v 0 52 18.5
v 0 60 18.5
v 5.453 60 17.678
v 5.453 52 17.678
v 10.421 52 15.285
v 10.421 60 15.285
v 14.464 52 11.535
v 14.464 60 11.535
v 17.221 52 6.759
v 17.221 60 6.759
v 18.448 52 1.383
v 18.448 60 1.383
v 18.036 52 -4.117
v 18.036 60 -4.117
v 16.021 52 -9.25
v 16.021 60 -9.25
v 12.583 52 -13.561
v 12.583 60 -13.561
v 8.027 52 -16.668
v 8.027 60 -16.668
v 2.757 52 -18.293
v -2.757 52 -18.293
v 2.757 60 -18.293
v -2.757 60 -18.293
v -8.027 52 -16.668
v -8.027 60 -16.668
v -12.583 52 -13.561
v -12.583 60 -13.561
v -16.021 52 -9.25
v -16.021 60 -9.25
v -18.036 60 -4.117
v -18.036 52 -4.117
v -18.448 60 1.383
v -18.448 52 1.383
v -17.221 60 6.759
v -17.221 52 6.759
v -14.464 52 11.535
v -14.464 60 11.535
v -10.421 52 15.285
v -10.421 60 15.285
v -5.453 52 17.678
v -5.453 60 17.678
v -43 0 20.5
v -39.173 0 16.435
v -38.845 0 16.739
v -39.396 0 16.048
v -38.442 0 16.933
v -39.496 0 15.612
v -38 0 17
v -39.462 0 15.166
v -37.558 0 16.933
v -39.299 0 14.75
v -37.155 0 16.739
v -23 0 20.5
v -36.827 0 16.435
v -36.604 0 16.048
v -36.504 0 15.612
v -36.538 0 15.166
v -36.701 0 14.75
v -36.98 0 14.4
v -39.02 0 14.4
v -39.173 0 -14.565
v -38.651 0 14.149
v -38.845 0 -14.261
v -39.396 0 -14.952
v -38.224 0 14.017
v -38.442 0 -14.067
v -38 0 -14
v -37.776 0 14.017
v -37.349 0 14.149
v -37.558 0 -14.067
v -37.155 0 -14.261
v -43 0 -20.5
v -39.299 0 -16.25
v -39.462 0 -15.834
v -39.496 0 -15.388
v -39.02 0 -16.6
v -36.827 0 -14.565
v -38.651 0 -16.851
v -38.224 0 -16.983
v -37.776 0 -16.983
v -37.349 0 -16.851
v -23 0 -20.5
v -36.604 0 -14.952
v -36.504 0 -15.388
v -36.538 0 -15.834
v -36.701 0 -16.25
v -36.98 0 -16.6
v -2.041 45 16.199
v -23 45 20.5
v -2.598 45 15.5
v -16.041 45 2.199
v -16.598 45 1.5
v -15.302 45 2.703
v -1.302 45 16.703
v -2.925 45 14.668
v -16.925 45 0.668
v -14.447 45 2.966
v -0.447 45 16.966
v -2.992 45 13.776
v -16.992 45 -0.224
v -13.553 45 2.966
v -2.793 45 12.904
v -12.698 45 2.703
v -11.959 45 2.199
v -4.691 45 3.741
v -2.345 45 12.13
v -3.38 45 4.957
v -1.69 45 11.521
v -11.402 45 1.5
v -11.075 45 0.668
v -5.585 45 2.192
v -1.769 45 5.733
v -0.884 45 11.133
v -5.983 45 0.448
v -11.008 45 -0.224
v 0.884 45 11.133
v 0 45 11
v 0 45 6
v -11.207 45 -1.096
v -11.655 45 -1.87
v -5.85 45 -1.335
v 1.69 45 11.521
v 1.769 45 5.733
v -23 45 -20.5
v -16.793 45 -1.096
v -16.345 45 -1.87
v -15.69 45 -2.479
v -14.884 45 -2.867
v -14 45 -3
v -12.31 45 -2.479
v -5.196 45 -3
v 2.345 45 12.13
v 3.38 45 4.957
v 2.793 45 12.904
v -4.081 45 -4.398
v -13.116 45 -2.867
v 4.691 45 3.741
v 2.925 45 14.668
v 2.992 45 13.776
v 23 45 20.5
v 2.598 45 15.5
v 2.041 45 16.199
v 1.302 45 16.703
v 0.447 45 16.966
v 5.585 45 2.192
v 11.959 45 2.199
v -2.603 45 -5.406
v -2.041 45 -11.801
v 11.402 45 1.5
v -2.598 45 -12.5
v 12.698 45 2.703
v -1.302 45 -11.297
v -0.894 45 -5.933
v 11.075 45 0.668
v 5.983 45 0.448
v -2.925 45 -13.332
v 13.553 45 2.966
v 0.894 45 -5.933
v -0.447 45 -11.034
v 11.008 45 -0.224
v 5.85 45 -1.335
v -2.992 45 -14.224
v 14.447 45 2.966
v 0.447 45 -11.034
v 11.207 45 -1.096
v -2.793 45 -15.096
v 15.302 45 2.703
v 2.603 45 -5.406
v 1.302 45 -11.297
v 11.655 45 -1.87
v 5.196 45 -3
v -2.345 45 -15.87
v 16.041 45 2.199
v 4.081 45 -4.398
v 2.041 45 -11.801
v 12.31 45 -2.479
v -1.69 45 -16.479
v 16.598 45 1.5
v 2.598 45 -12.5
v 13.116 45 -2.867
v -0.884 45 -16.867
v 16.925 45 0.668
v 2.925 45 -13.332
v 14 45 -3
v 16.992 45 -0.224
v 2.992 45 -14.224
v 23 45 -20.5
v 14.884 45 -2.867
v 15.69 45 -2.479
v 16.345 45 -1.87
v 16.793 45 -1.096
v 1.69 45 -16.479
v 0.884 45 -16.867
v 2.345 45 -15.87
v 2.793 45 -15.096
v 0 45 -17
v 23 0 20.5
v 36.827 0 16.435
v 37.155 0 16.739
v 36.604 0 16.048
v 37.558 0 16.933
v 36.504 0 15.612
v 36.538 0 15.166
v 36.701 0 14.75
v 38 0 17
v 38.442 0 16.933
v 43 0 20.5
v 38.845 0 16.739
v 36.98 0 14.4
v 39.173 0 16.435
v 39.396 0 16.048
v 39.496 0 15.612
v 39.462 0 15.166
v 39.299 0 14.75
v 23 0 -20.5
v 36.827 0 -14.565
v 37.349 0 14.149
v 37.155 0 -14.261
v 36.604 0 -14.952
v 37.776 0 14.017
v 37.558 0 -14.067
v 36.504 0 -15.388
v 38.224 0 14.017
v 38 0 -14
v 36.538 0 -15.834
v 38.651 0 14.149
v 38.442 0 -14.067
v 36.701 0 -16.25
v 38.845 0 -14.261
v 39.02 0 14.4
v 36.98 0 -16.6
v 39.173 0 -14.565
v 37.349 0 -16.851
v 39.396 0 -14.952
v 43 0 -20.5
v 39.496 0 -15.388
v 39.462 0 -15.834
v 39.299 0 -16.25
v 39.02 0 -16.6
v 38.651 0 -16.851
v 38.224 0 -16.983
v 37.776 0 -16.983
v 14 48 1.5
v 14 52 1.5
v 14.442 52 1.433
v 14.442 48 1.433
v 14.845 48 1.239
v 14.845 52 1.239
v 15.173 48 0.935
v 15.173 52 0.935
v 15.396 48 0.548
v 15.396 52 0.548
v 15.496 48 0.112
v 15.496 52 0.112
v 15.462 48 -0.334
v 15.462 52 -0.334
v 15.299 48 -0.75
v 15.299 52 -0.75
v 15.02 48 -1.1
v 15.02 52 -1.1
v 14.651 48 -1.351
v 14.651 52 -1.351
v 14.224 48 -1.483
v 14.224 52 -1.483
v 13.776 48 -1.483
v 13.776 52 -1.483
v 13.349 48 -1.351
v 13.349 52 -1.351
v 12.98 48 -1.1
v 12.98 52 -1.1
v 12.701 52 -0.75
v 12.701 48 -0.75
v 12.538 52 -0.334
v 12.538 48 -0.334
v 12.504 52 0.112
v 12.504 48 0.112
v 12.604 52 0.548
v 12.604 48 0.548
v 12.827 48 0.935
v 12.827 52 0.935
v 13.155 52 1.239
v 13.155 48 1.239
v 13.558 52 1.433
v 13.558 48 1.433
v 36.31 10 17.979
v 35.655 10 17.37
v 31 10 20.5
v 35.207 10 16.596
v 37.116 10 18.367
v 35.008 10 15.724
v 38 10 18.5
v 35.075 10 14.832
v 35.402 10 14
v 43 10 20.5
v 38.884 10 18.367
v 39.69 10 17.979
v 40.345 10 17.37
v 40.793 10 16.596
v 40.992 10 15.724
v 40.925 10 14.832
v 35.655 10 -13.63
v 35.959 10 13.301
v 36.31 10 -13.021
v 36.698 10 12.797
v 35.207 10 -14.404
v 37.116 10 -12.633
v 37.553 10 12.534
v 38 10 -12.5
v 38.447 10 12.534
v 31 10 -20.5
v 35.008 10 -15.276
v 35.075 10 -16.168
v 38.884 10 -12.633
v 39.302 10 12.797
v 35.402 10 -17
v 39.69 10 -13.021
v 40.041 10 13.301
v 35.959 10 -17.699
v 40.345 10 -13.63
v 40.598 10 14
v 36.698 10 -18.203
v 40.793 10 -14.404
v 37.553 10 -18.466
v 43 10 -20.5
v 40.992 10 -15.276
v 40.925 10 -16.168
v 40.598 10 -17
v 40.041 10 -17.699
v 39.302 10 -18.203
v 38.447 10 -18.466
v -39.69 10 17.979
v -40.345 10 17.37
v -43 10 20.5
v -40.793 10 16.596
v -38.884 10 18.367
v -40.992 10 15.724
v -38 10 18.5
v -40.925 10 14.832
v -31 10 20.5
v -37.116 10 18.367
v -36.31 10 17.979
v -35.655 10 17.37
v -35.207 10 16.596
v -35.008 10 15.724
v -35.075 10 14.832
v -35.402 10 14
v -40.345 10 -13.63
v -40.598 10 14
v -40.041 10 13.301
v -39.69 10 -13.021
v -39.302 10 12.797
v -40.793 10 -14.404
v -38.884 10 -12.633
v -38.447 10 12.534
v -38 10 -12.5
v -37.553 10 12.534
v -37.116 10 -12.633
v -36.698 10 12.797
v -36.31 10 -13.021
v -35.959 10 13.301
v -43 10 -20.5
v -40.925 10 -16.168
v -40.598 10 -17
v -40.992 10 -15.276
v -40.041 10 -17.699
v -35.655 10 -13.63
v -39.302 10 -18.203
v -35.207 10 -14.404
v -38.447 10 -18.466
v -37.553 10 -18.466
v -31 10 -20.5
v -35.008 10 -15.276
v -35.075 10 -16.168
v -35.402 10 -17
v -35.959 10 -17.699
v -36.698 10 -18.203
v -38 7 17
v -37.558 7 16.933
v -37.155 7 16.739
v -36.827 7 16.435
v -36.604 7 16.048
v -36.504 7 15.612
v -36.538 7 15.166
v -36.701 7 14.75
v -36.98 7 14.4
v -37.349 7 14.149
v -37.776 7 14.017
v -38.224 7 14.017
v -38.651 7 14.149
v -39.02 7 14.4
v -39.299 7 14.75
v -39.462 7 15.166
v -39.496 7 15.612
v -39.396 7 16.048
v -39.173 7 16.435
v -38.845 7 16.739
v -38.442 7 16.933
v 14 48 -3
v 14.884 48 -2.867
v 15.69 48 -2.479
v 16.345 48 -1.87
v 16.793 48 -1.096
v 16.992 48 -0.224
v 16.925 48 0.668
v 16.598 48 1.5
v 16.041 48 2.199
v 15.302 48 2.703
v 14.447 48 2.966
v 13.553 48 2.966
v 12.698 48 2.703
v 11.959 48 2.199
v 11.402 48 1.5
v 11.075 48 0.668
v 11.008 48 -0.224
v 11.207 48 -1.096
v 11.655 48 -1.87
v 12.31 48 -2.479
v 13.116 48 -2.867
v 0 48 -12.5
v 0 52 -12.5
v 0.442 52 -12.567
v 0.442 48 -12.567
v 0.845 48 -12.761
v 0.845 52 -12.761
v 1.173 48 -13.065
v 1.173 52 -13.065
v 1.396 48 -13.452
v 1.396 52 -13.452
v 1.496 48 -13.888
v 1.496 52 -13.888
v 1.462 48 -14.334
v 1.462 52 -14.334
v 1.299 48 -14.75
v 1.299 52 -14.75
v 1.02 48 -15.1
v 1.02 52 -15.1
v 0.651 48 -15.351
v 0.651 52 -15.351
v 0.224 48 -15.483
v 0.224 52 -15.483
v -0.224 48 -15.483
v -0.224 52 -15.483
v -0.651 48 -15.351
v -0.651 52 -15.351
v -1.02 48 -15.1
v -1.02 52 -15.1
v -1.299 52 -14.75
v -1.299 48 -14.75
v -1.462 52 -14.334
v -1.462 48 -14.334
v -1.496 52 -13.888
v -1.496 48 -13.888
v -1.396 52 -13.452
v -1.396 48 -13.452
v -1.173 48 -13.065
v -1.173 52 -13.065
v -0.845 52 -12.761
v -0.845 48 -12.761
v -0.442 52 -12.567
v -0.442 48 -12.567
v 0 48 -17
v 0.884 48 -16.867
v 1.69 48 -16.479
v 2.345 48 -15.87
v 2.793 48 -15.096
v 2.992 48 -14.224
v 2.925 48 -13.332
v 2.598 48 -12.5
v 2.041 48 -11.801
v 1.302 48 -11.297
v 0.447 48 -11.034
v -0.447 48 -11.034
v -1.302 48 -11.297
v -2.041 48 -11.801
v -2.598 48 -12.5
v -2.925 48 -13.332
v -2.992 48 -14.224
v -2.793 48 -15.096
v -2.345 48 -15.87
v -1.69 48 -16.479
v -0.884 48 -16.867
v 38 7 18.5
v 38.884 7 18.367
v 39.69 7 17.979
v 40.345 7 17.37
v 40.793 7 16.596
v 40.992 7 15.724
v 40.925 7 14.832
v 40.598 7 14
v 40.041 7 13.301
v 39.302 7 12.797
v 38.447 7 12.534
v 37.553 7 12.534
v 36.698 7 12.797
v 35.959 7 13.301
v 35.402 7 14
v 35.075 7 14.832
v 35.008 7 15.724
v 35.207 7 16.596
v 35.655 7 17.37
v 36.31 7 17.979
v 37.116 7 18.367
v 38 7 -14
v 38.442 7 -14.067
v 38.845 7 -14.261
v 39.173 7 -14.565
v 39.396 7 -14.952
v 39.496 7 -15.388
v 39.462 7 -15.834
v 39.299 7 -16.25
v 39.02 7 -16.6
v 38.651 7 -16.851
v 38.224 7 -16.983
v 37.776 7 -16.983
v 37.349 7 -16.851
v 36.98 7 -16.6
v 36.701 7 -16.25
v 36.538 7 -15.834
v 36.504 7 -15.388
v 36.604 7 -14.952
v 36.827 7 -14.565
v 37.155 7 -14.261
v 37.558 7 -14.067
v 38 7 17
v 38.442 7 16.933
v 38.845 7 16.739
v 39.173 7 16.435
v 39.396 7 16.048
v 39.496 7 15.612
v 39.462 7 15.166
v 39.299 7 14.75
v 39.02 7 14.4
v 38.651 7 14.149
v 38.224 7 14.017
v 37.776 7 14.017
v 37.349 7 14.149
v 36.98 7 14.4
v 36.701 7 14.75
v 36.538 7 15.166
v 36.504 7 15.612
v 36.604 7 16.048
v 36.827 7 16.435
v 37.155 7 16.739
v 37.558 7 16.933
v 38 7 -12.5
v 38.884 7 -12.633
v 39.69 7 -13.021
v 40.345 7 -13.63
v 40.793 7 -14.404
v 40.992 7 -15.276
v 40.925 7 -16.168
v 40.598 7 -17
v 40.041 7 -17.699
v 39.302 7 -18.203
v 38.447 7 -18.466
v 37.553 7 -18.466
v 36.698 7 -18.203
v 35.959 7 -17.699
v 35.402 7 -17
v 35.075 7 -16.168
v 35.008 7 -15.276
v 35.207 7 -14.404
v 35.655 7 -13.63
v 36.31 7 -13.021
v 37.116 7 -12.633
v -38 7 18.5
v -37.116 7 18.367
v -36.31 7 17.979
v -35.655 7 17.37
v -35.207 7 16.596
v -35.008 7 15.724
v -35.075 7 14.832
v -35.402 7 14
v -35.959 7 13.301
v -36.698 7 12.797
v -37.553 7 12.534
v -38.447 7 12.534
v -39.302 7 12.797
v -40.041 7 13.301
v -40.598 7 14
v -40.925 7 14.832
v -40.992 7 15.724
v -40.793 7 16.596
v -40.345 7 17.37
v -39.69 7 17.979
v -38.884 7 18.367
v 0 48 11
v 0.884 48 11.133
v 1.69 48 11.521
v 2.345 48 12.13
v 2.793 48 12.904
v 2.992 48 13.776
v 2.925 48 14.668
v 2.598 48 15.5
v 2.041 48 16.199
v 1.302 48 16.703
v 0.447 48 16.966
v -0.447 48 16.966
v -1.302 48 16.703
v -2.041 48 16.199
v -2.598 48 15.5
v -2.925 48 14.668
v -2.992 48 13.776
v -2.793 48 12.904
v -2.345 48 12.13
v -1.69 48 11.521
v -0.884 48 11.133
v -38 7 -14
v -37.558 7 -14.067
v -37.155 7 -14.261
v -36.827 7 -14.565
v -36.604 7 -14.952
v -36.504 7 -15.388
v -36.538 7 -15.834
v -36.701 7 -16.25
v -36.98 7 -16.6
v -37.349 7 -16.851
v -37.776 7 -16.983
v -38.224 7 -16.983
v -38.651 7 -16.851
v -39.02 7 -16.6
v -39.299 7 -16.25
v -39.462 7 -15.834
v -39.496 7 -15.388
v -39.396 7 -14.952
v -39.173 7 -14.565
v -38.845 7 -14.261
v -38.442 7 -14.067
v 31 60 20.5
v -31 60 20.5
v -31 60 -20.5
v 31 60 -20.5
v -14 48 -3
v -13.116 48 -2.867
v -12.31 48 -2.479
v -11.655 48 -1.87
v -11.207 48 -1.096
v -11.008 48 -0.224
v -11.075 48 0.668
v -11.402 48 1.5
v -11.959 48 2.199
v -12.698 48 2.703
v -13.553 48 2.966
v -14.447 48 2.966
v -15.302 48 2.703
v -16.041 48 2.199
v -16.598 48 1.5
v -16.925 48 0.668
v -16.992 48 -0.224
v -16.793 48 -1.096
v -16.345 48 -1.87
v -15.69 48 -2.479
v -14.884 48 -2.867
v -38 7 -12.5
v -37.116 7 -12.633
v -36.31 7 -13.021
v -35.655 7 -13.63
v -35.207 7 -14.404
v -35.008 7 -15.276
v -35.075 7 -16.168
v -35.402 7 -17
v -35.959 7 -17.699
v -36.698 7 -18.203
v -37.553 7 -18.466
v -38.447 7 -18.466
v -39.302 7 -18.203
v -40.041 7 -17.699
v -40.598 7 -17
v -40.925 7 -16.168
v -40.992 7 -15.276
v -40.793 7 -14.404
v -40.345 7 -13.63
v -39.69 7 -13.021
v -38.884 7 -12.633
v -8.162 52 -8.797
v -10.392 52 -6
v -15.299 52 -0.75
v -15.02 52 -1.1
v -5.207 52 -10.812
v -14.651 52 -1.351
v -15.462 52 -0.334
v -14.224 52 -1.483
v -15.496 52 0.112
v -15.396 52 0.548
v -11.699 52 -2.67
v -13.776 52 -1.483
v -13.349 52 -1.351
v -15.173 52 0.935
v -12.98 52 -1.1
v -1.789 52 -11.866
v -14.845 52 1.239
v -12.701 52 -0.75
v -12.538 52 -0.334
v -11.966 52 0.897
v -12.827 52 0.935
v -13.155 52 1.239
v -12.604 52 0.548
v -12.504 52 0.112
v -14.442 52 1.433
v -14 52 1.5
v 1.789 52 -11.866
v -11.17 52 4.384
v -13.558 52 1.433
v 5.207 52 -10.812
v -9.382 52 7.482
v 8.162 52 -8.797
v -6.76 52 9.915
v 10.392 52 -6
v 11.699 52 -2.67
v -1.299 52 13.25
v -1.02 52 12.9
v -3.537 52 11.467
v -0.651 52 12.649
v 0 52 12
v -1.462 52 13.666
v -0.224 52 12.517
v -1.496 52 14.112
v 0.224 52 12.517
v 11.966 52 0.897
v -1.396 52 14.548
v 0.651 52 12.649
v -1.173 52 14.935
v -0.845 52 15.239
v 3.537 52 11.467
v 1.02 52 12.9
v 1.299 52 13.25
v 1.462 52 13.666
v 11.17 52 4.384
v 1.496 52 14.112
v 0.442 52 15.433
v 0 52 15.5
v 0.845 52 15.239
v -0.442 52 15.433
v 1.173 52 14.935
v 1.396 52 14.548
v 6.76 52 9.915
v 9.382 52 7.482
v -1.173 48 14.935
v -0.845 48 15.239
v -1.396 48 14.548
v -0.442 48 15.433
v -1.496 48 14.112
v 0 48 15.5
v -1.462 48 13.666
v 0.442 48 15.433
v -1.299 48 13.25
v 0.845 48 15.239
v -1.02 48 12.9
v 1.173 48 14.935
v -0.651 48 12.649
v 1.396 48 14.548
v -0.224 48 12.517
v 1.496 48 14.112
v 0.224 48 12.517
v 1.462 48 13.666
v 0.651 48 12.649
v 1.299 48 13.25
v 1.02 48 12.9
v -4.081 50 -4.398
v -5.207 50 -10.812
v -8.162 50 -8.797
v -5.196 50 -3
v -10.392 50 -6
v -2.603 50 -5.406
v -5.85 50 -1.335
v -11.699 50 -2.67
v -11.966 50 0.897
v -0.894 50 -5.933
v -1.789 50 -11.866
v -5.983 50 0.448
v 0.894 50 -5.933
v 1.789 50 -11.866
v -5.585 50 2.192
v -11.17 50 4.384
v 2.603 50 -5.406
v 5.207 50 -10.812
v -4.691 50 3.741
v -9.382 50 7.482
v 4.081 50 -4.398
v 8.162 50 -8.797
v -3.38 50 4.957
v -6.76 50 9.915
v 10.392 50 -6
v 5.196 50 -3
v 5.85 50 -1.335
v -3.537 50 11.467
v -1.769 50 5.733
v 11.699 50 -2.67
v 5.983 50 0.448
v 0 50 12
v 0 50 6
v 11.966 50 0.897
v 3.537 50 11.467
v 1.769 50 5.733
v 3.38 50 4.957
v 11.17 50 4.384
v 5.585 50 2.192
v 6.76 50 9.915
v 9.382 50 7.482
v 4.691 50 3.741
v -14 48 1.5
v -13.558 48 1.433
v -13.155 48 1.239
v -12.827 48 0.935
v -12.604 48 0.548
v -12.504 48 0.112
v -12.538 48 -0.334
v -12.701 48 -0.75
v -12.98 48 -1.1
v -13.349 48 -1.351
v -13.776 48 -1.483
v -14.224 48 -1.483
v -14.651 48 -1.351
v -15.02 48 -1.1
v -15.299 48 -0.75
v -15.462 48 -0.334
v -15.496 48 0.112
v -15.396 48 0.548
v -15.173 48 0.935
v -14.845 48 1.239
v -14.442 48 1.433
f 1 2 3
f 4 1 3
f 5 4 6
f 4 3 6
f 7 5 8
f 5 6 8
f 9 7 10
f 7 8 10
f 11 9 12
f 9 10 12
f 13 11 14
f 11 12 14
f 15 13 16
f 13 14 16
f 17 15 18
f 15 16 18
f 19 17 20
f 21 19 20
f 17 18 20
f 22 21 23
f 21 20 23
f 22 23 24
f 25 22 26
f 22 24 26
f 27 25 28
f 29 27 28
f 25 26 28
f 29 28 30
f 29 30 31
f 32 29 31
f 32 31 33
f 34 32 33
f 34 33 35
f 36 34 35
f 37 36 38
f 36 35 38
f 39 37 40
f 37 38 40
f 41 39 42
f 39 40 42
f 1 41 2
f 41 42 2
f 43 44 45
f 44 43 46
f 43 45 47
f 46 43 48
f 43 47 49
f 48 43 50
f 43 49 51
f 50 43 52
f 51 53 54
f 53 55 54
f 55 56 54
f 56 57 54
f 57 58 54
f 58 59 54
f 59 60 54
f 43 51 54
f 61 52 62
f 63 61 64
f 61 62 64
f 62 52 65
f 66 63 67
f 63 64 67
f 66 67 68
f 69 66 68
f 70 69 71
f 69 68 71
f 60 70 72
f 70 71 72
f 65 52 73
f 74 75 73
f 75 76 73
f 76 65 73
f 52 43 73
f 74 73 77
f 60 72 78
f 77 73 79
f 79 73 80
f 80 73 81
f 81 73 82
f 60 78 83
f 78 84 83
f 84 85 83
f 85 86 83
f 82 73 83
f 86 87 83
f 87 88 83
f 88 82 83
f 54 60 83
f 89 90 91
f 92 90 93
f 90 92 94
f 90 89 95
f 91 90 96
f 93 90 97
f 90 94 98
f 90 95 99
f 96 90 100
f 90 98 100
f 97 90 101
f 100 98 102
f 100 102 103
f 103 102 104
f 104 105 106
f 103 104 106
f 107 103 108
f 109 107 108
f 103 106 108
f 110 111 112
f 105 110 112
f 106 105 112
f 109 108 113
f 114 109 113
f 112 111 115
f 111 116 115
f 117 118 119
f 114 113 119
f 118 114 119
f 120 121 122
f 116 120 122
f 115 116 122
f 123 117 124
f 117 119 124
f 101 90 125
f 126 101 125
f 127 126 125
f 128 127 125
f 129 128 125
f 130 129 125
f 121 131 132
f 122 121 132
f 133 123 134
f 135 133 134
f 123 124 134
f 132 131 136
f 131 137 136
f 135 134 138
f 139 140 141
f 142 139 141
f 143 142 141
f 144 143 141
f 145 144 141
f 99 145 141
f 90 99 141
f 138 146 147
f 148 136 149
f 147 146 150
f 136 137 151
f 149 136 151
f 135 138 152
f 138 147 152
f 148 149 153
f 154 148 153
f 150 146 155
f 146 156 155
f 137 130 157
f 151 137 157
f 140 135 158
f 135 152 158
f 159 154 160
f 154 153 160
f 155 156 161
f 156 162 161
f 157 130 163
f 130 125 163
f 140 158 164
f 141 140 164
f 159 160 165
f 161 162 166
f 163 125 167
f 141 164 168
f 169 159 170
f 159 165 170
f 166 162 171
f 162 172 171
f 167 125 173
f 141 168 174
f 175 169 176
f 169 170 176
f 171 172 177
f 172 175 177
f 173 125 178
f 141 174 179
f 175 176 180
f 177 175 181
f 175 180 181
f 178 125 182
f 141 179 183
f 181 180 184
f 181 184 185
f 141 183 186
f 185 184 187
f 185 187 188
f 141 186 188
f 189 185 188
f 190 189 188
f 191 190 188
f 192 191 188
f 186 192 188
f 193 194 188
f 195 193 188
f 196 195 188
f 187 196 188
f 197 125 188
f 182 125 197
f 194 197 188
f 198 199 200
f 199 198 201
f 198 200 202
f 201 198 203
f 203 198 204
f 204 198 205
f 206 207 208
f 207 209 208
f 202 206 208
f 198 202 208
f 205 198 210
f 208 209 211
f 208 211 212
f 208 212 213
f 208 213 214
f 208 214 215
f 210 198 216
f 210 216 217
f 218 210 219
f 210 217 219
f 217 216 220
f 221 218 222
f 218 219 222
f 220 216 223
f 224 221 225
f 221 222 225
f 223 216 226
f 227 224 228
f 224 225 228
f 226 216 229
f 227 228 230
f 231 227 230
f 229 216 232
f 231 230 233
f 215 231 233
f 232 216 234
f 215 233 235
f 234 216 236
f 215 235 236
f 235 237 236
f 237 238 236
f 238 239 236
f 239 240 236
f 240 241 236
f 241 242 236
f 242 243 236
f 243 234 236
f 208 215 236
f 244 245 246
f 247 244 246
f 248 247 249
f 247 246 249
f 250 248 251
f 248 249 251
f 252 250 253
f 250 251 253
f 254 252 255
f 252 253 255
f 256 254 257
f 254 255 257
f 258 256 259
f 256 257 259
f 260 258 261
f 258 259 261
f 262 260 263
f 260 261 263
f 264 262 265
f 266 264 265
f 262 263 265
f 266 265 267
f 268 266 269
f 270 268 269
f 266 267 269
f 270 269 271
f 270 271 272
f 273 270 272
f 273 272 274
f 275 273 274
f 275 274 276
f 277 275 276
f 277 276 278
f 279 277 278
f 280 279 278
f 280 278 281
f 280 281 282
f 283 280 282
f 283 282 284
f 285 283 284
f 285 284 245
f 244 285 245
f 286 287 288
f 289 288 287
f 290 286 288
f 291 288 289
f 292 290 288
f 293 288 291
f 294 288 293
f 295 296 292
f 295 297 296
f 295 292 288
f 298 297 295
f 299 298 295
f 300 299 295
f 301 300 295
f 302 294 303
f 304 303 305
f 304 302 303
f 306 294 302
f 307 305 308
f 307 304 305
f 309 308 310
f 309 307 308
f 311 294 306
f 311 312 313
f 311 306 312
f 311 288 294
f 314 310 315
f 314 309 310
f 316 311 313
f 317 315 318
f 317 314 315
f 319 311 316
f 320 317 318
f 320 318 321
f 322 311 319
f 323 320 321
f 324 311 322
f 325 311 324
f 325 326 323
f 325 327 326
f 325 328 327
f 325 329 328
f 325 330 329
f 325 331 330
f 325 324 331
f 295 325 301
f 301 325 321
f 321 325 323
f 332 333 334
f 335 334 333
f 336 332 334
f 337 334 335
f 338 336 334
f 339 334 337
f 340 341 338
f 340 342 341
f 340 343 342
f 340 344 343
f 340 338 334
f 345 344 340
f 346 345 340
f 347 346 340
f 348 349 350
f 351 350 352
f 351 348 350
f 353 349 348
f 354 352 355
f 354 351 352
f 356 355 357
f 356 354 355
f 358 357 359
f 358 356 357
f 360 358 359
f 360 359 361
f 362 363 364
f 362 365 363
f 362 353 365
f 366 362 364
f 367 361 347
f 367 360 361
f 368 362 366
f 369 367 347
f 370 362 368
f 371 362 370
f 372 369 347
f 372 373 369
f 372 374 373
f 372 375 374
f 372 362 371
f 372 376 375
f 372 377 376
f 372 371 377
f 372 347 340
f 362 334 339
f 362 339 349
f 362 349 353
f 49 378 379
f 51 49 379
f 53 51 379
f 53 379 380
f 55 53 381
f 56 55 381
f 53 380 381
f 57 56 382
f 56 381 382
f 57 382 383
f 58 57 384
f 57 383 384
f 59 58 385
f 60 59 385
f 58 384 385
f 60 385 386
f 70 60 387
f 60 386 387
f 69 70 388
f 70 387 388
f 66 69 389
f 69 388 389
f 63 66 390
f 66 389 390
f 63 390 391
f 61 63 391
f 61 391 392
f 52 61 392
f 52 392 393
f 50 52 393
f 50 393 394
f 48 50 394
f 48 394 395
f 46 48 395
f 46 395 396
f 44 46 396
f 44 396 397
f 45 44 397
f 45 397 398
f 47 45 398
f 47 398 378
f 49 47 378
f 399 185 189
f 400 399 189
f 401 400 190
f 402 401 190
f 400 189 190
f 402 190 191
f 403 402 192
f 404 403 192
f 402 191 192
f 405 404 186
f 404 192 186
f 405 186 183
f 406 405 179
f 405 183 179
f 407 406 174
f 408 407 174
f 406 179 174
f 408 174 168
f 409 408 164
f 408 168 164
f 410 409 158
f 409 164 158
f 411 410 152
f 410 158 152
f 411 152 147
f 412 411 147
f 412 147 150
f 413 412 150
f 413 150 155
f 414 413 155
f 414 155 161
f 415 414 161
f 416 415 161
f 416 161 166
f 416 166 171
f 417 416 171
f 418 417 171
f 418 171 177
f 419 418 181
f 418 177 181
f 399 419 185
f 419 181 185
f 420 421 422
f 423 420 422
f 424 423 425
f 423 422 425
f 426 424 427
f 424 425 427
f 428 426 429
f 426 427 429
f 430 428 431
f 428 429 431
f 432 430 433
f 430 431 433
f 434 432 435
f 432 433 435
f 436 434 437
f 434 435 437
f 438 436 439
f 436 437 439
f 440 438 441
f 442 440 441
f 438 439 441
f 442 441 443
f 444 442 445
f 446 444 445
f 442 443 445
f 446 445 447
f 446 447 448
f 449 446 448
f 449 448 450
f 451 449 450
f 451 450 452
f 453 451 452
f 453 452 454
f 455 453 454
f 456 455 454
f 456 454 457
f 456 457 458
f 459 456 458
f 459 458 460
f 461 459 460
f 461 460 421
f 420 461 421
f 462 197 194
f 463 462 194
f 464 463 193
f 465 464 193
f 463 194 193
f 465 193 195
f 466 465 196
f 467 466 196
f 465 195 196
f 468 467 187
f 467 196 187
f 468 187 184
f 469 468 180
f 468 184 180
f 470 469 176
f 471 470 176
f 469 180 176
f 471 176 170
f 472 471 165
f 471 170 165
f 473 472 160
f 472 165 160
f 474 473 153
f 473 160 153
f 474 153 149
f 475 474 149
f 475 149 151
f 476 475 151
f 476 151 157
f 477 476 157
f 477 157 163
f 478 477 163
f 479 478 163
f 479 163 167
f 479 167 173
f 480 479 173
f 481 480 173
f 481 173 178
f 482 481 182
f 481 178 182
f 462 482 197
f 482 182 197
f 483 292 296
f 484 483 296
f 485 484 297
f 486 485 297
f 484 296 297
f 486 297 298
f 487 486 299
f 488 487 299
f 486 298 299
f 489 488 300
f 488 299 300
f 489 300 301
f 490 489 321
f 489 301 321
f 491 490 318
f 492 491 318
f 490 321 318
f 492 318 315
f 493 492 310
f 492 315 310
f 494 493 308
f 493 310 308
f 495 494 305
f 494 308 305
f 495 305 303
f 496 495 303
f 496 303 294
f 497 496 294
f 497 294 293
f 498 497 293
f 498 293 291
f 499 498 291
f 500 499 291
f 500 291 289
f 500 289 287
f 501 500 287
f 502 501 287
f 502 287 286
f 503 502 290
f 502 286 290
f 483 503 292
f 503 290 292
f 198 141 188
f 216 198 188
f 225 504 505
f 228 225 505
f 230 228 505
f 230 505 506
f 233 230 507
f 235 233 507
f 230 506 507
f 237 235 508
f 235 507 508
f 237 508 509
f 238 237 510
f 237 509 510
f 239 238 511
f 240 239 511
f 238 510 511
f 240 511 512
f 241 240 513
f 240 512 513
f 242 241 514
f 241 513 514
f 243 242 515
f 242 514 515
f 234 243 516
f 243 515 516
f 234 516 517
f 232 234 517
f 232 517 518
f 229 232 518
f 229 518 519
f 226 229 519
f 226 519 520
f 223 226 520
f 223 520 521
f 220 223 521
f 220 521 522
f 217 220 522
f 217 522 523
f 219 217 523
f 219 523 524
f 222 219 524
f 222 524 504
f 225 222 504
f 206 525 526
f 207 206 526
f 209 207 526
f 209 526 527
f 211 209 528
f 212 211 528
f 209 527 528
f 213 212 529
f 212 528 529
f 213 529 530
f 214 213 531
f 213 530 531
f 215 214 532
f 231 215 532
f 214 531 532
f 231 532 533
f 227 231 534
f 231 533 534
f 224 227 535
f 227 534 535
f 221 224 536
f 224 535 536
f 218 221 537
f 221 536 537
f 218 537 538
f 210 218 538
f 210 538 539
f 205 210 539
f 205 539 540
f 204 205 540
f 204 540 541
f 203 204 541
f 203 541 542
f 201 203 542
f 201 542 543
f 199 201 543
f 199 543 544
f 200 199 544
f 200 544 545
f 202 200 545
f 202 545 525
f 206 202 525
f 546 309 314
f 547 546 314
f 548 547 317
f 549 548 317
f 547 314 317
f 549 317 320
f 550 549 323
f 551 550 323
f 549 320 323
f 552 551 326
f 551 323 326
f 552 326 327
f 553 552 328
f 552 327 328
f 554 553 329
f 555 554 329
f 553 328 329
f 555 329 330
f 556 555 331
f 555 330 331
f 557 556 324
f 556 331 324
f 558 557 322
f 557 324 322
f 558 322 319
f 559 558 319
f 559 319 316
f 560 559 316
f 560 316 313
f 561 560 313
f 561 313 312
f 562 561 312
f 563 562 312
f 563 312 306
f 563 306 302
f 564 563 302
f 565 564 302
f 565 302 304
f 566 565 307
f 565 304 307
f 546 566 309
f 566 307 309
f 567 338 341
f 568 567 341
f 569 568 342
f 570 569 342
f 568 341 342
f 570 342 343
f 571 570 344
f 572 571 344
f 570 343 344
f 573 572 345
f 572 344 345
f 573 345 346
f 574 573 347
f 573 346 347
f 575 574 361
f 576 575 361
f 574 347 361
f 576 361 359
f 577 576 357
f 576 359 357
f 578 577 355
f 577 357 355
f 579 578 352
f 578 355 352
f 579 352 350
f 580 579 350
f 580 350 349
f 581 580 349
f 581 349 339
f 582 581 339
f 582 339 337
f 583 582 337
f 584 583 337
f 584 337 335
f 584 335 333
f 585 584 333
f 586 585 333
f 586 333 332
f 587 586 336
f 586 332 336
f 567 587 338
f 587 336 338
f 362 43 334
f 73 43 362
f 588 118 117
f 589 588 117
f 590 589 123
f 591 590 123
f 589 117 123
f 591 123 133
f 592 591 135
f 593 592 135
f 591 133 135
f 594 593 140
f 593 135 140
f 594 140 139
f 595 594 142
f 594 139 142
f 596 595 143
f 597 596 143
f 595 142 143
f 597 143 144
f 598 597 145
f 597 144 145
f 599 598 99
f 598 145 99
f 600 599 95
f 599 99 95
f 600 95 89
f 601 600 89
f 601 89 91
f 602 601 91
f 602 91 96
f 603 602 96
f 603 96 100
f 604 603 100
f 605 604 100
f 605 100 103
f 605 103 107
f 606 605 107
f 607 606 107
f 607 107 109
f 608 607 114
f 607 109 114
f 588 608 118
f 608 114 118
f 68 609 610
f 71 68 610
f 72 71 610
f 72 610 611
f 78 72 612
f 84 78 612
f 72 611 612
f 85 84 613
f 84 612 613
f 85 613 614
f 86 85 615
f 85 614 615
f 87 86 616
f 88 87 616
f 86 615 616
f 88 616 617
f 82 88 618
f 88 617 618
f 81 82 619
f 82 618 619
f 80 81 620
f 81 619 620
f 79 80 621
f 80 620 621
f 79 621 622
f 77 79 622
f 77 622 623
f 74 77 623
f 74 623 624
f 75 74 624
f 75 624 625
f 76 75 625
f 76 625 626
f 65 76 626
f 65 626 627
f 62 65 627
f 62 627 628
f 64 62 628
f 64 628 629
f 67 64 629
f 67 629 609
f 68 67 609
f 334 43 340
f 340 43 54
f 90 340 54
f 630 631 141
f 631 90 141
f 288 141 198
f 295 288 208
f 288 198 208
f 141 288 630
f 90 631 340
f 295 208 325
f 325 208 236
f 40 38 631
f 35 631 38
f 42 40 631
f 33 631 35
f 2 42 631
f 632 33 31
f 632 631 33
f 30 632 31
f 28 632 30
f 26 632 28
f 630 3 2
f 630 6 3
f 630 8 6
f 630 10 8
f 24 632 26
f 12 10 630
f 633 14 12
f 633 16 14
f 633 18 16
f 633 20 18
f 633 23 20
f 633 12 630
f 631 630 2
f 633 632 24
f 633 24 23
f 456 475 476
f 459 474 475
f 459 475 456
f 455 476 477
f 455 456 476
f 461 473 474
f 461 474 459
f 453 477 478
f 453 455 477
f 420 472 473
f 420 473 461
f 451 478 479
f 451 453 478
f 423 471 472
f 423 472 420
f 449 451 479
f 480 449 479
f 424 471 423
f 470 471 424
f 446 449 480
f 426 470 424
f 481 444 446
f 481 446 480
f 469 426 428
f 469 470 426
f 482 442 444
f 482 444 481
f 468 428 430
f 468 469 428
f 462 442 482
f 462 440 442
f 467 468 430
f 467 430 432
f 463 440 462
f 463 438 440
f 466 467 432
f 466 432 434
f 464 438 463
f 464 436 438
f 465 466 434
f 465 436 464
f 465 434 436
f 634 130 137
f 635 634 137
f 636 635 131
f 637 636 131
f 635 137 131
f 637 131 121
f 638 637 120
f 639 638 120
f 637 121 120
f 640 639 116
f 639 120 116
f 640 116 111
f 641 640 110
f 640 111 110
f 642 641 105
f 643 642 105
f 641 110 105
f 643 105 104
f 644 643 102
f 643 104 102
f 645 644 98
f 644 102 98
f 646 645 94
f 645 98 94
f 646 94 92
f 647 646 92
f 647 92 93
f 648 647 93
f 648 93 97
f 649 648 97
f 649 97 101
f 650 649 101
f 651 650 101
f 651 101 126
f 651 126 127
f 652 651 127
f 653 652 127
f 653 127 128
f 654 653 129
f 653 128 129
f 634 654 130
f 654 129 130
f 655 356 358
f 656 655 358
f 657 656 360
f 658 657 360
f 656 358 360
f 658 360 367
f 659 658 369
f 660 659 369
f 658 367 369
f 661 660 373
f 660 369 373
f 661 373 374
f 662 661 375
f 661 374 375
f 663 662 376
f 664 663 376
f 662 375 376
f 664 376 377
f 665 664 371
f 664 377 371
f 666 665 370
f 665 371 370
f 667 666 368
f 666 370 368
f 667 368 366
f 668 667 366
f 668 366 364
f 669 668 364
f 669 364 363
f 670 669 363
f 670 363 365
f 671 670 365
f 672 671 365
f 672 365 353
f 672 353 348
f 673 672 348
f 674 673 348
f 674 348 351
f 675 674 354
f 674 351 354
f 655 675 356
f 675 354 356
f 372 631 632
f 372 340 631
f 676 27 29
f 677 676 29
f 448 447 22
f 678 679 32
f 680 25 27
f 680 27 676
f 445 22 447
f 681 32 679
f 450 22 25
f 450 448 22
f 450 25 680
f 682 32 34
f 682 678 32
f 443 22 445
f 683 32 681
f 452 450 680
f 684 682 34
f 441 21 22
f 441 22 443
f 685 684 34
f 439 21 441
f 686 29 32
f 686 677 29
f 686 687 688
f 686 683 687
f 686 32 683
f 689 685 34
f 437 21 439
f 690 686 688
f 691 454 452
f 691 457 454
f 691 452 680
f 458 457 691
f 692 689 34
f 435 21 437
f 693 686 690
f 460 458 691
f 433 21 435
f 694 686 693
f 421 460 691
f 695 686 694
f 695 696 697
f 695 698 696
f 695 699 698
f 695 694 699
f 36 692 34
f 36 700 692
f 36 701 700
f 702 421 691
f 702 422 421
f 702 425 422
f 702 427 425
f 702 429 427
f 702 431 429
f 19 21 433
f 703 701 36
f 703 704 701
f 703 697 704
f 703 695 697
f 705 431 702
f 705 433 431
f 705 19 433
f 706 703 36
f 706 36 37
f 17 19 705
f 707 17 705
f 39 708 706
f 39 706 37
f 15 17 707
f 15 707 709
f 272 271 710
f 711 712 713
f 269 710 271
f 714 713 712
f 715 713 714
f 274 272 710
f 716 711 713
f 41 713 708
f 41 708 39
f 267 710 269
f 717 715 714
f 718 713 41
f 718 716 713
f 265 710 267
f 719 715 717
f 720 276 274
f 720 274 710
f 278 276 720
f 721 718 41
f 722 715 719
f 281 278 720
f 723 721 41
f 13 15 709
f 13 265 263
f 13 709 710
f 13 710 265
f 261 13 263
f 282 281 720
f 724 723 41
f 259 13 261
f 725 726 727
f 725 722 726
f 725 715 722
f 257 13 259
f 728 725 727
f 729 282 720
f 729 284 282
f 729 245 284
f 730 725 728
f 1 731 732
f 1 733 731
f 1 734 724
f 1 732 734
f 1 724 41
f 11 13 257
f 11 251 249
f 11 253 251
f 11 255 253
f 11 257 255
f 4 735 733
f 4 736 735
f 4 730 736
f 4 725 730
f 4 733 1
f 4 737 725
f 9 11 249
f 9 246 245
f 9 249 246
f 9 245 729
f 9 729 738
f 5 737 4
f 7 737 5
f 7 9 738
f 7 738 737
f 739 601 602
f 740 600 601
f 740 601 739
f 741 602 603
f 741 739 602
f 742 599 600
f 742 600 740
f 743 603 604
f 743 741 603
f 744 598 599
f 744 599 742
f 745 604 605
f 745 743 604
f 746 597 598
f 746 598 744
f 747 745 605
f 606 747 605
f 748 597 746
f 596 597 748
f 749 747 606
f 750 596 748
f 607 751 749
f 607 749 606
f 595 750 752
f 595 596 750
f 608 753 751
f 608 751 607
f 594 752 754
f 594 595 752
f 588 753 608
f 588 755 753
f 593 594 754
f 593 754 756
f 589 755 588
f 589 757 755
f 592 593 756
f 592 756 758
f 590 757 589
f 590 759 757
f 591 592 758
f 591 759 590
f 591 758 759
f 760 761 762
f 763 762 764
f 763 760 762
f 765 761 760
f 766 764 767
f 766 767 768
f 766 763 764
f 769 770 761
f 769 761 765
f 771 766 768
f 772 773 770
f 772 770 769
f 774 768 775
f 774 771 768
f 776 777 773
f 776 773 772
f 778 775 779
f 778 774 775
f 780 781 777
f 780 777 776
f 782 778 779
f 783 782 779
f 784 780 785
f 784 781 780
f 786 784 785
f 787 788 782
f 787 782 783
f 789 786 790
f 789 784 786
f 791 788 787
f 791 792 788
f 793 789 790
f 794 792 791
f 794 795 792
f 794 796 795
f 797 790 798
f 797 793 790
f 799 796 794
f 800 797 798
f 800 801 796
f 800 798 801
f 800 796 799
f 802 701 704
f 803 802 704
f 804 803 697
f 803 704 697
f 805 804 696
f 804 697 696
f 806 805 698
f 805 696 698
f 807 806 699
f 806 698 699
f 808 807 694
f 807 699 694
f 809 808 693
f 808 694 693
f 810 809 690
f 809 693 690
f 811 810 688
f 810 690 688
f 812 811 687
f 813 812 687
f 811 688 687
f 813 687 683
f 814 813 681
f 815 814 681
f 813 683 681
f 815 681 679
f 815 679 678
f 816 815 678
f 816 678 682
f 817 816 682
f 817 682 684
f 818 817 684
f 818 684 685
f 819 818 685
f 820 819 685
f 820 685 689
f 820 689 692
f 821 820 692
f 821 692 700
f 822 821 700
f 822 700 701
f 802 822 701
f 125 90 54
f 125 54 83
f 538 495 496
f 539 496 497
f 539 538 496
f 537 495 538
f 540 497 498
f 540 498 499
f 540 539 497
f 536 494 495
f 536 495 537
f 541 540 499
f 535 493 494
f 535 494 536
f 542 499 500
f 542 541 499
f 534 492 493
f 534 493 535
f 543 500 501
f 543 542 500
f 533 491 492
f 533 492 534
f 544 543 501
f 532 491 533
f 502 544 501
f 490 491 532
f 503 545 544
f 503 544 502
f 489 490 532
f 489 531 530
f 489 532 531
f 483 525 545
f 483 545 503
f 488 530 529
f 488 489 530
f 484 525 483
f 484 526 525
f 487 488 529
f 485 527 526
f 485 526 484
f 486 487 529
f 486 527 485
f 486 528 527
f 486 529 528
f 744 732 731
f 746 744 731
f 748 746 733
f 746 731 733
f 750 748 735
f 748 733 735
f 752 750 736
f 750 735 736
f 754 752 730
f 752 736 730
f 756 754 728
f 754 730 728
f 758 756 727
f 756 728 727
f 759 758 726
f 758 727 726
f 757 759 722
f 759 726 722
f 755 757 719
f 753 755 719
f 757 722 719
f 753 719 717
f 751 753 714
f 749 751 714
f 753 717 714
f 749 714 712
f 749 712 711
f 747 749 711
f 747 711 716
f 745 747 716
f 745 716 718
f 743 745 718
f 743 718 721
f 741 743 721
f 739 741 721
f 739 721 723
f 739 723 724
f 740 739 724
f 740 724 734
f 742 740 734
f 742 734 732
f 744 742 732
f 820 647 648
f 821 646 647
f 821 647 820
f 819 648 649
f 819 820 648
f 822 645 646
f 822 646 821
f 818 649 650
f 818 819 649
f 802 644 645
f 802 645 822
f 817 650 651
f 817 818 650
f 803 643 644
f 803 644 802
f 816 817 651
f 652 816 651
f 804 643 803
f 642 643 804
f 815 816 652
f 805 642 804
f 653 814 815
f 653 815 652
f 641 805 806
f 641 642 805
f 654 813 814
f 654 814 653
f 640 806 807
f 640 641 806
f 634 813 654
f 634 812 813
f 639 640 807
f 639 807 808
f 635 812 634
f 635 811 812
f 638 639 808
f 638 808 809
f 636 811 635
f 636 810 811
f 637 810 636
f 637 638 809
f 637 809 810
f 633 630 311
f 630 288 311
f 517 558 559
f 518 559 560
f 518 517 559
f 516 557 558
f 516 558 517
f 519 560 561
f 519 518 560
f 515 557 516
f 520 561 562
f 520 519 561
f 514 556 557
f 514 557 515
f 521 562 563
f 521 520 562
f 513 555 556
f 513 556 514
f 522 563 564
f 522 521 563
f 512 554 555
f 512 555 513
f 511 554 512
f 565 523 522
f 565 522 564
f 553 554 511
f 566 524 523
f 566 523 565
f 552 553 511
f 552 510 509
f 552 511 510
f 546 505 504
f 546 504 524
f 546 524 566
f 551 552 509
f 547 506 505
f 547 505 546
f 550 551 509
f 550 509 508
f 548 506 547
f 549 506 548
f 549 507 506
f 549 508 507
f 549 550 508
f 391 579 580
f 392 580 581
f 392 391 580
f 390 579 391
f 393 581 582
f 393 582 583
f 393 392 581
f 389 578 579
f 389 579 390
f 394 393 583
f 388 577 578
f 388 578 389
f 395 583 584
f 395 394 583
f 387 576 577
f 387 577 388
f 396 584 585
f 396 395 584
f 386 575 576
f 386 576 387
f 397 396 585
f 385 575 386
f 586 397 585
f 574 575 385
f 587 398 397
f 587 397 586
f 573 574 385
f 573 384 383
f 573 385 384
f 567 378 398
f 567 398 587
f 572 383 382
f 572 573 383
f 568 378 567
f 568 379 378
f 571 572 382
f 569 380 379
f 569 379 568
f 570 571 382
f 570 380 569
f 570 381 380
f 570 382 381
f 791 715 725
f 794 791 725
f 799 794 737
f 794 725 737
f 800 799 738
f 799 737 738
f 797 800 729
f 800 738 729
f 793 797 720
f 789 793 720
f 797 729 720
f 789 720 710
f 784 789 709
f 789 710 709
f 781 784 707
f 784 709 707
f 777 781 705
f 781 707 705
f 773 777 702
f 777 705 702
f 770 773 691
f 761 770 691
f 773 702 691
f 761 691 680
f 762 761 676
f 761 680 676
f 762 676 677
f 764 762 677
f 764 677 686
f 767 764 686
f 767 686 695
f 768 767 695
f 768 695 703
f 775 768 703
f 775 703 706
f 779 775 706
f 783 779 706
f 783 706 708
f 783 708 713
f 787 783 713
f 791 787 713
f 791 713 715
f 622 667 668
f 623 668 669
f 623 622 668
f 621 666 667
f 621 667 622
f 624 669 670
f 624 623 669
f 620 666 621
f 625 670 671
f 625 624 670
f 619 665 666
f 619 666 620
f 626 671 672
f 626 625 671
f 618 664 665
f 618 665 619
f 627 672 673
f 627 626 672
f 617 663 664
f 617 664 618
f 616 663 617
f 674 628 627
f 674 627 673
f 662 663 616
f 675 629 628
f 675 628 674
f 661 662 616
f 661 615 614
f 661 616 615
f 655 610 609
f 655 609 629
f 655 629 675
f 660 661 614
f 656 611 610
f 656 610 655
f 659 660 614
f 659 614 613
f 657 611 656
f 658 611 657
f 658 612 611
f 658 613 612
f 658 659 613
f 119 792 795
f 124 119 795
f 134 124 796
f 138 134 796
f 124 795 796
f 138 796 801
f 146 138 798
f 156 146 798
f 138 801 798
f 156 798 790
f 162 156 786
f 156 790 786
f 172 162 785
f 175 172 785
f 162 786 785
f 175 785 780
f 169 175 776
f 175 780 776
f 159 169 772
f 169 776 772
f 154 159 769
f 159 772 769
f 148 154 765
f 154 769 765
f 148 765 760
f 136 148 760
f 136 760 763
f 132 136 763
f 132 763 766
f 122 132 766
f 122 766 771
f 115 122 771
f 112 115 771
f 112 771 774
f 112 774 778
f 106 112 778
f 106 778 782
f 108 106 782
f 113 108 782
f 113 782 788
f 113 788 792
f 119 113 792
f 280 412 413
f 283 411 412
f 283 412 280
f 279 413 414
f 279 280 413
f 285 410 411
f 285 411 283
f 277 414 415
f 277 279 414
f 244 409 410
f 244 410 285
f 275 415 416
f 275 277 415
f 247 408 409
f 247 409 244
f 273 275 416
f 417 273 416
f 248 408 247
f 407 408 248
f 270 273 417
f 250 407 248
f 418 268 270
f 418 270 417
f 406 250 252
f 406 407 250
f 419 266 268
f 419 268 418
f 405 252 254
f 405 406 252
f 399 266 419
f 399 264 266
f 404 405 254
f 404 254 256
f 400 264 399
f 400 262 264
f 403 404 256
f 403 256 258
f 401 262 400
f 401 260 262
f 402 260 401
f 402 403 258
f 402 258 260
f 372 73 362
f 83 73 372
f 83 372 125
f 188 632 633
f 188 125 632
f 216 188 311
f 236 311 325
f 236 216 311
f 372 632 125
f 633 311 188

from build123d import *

# Parameters (mm, degrees)
SKETCH1_W                      = 20
SKETCH1_H                      = 41
BOSS_EXTRUDE1_DEPTH            = 10
BOSS_EXTRUDE1_2_DEPTH          = 10
SKETCH2_R                      = 1.5
CUT_EXTRUDE1_DEPTH             = 10
SKETCH3_R                      = 3
CUT_EXTRUDE2_DEPTH             = 3
SKETCH4_W                      = 8
SKETCH4_H                      = 41
BOSS_EXTRUDE2_DEPTH            = 35
SKETCH5_W                      = 62
SKETCH5_H                      = 41
BOSS_EXTRUDE3_DEPTH            = 15
CUT_EXTRUDE3_REACH             = 78.611
SKETCH6_R                      = 1.5
SKETCH7_R                      = 3
CUT_EXTRUDE4_DEPTH             = 3
SKETCH8_R                      = 12
CUT_EXTRUDE5_DEPTH             = 10
CUT_EXTRUDE6_REACH             = 78.611
SKETCH9_R                      = 6
CUT_EXTRUDE6_DIRECTION_2_DEPTH = 77.611030537
SKETCH10_R                     = 18.5
CUT_EXTRUDE7_DEPTH             = 8


with BuildPart() as part:
    # Sketch1 → Boss-Extrude1 (new body)
    with BuildSketch(Plane(origin=(0, 0, 0), x_dir=(1, 0, 0), z_dir=(0, 1, 0))):
        with Locations((33, 0)):
            Rectangle(SKETCH1_W, SKETCH1_H)
    extrude(amount=BOSS_EXTRUDE1_DEPTH)


with BuildPart() as body_2:
    # Sketch1 → Boss-Extrude1 2 (new body)
    with BuildSketch(Plane(origin=(0, 0, 0), x_dir=(1, 0, 0), z_dir=(0, 1, 0))):
        with Locations((-33, 0)):
            Rectangle(SKETCH1_W, SKETCH1_H)
    extrude(amount=BOSS_EXTRUDE1_2_DEPTH)


with BuildPart() as cut_extrude1_tool:
    # Sketch2 → Cut-Extrude1 (new body)
    with BuildSketch(Plane(origin=(0, 10, 0), x_dir=(1, 0, 0), z_dir=(0, 1, 0))):
        with Locations(Location((-38, 15.5, 0), (0, 0, 270))):
            Circle(SKETCH2_R)
        with Locations(Location((-38, -15.5, 0), (0, 0, 270))):
            Circle(SKETCH2_R)
        with Locations(Location((38, -15.5, 0), (0, 0, 270))):
            Circle(SKETCH2_R)
        with Locations(Location((38, 15.5, 0), (0, 0, 270))):
            Circle(SKETCH2_R)
    extrude(amount=-CUT_EXTRUDE1_DEPTH)


with BuildPart() as part_1:
    add(part.part)

    # Cut-Extrude1: cut by cut_extrude1_tool
    add(cut_extrude1_tool.part, mode=Mode.SUBTRACT)


with BuildPart() as body_2_1:
    add(body_2.part)

    # Cut-Extrude1: cut by cut_extrude1_tool
    add(cut_extrude1_tool.part, mode=Mode.SUBTRACT)


with BuildPart() as cut_extrude2_tool:
    # Sketch3 → Cut-Extrude2 (new body)
    with BuildSketch(Plane(origin=(0, 10, 0), x_dir=(1, 0, 0), z_dir=(0, 1, 0))):
        with Locations(Location((-38, 15.5, 0), (0, 0, 270))):
            Circle(SKETCH3_R)
        with Locations(Location((-38, -15.5, 0), (0, 0, 270))):
            Circle(SKETCH3_R)
        with Locations(Location((38, -15.5, 0), (0, 0, 270))):
            Circle(SKETCH3_R)
        with Locations(Location((38, 15.5, 0), (0, 0, 270))):
            Circle(SKETCH3_R)
    extrude(amount=-CUT_EXTRUDE2_DEPTH)


with BuildPart() as part_2:
    add(part_1.part)

    # Cut-Extrude2: cut by cut_extrude2_tool
    add(cut_extrude2_tool.part, mode=Mode.SUBTRACT)



with BuildPart() as body_2_2:
    add(body_2_1.part)

    # Cut-Extrude2: cut by cut_extrude2_tool
    add(cut_extrude2_tool.part, mode=Mode.SUBTRACT)


with BuildPart() as part_3:
    add(part_2.part)

    add(body_2_2.part)  # Boss-Extrude2 merges body 2
    # Sketch4 → Boss-Extrude2 (add)
    with BuildSketch(Plane(origin=(0, 10, 0), x_dir=(1, 0, 0), z_dir=(0, 1, 0))):
        with Locations((-27, 0)):
            Rectangle(SKETCH4_W, SKETCH4_H)
        with Locations((27, 0)):
            Rectangle(SKETCH4_W, SKETCH4_H)
    extrude(amount=BOSS_EXTRUDE2_DEPTH)

    # Sketch5 → Boss-Extrude3 (add)
    with BuildSketch(Plane(origin=(0, 45, 0), x_dir=(1, 0, 0), z_dir=(0, 1, 0))):
        Rectangle(SKETCH5_W, SKETCH5_H)
    extrude(amount=BOSS_EXTRUDE3_DEPTH)

    # Sketch6 → Cut-Extrude3 (cut, up to next)
    with BuildSketch(Plane(origin=(0, 60, 0), x_dir=(1, 0, 0), z_dir=(0, 1, 0)), mode=Mode.PRIVATE) as cut_extrude3_sk1:
        with Locations(Location((-14, 0, 0), (0, 0, 270))):
            Circle(SKETCH6_R)
    cut_extrude3_tool1 = extrude(cut_extrude3_sk1.sketch, amount=-CUT_EXTRUDE3_REACH, mode=Mode.PRIVATE) & part_3.part
    # Sketch6 → Cut-Extrude3 (cut, up to next)
    with BuildSketch(Plane(origin=(0, 60, 0), x_dir=(1, 0, 0), z_dir=(0, 1, 0)), mode=Mode.PRIVATE) as cut_extrude3_sk2:
        with Locations(Location((0, 14, 0), (0, 0, 270))):
            Circle(SKETCH6_R)
    cut_extrude3_tool2 = extrude(cut_extrude3_sk2.sketch, amount=-CUT_EXTRUDE3_REACH, mode=Mode.PRIVATE) & part_3.part
    # Sketch6 → Cut-Extrude3 (cut, up to next)
    with BuildSketch(Plane(origin=(0, 60, 0), x_dir=(1, 0, 0), z_dir=(0, 1, 0)), mode=Mode.PRIVATE) as cut_extrude3_sk3:
        with Locations(Location((14, 0, 0), (0, 0, 270))):
            Circle(SKETCH6_R)
    cut_extrude3_tool3 = extrude(cut_extrude3_sk3.sketch, amount=-CUT_EXTRUDE3_REACH, mode=Mode.PRIVATE) & part_3.part
    # Sketch6 → Cut-Extrude3 (cut, up to next)
    with BuildSketch(Plane(origin=(0, 60, 0), x_dir=(1, 0, 0), z_dir=(0, 1, 0)), mode=Mode.PRIVATE) as cut_extrude3_sk4:
        with Locations(Location((0, -14, 0), (0, 0, 270))):
            Circle(SKETCH6_R)
    cut_extrude3_tool4 = extrude(cut_extrude3_sk4.sketch, amount=-CUT_EXTRUDE3_REACH, mode=Mode.PRIVATE) & part_3.part
    add(cut_extrude3_tool1.solids().sort_by_distance((-14, 60, 0))[0], mode=Mode.SUBTRACT)
    add(cut_extrude3_tool2.solids().sort_by_distance((0, 60, -14))[0], mode=Mode.SUBTRACT)
    add(cut_extrude3_tool3.solids().sort_by_distance((14, 60, 0))[0], mode=Mode.SUBTRACT)
    add(cut_extrude3_tool4.solids().sort_by_distance((0, 60, 14))[0], mode=Mode.SUBTRACT)

    # Sketch7 → Cut-Extrude4 (cut)
    with BuildSketch(Plane.XZ.offset(-45)):
        with Locations(Location((0, 14, 0), (0, 0, 270))):
            Circle(SKETCH7_R)
        with Locations(Location((14, 0, 0), (0, 0, 270))):
            Circle(SKETCH7_R)
        with Locations(Location((0, -14, 0), (0, 0, 270))):
            Circle(SKETCH7_R)
        with Locations(Location((-14, 0, 0), (0, 0, 270))):
            Circle(SKETCH7_R)
    extrude(amount=-CUT_EXTRUDE4_DEPTH, mode=Mode.SUBTRACT)

    # Sketch8 → Cut-Extrude5 (cut)
    with BuildSketch(Plane(origin=(0, 60, 0), x_dir=(1, 0, 0), z_dir=(0, 1, 0))):
        with Locations(Location((0, 0, 0), (0, 0, 270))):
            Circle(SKETCH8_R)
    extrude(amount=-CUT_EXTRUDE5_DEPTH, mode=Mode.SUBTRACT)

    # Sketch9 → Cut-Extrude6 (cut, up to next)
    with BuildSketch(Plane(origin=(0, 60, 0), x_dir=(1, 0, 0), z_dir=(0, 1, 0)), mode=Mode.PRIVATE) as cut_extrude6_sk1:
        with Locations(Location((0, 0, 0), (0, 0, 270))):
            Circle(SKETCH9_R)
    cut_extrude6_tool1 = extrude(cut_extrude6_sk1.sketch, amount=-CUT_EXTRUDE6_REACH, mode=Mode.PRIVATE) & part_3.part
    add(cut_extrude6_tool1.solids().sort_by_distance((0, 60, 0))[0], mode=Mode.SUBTRACT)

    # Sketch9 → Cut-Extrude6 direction 2 (cut)
    with BuildSketch(Plane(origin=(0, 60, 0), x_dir=(1, 0, 0), z_dir=(0, 1, 0))):
        with Locations(Location((0, 0, 0), (0, 0, 270))):
            Circle(SKETCH9_R)
    extrude(amount=CUT_EXTRUDE6_DIRECTION_2_DEPTH, mode=Mode.SUBTRACT)

    # Sketch10 → Cut-Extrude7 (cut)
    with BuildSketch(Plane(origin=(0, 60, 0), x_dir=(1, 0, 0), z_dir=(0, 1, 0))):
        with Locations(Location((0, 0, 0), (0, 0, 270))):
            Circle(SKETCH10_R)
    extrude(amount=-CUT_EXTRUDE7_DEPTH, mode=Mode.SUBTRACT)


solid = part_3.part
